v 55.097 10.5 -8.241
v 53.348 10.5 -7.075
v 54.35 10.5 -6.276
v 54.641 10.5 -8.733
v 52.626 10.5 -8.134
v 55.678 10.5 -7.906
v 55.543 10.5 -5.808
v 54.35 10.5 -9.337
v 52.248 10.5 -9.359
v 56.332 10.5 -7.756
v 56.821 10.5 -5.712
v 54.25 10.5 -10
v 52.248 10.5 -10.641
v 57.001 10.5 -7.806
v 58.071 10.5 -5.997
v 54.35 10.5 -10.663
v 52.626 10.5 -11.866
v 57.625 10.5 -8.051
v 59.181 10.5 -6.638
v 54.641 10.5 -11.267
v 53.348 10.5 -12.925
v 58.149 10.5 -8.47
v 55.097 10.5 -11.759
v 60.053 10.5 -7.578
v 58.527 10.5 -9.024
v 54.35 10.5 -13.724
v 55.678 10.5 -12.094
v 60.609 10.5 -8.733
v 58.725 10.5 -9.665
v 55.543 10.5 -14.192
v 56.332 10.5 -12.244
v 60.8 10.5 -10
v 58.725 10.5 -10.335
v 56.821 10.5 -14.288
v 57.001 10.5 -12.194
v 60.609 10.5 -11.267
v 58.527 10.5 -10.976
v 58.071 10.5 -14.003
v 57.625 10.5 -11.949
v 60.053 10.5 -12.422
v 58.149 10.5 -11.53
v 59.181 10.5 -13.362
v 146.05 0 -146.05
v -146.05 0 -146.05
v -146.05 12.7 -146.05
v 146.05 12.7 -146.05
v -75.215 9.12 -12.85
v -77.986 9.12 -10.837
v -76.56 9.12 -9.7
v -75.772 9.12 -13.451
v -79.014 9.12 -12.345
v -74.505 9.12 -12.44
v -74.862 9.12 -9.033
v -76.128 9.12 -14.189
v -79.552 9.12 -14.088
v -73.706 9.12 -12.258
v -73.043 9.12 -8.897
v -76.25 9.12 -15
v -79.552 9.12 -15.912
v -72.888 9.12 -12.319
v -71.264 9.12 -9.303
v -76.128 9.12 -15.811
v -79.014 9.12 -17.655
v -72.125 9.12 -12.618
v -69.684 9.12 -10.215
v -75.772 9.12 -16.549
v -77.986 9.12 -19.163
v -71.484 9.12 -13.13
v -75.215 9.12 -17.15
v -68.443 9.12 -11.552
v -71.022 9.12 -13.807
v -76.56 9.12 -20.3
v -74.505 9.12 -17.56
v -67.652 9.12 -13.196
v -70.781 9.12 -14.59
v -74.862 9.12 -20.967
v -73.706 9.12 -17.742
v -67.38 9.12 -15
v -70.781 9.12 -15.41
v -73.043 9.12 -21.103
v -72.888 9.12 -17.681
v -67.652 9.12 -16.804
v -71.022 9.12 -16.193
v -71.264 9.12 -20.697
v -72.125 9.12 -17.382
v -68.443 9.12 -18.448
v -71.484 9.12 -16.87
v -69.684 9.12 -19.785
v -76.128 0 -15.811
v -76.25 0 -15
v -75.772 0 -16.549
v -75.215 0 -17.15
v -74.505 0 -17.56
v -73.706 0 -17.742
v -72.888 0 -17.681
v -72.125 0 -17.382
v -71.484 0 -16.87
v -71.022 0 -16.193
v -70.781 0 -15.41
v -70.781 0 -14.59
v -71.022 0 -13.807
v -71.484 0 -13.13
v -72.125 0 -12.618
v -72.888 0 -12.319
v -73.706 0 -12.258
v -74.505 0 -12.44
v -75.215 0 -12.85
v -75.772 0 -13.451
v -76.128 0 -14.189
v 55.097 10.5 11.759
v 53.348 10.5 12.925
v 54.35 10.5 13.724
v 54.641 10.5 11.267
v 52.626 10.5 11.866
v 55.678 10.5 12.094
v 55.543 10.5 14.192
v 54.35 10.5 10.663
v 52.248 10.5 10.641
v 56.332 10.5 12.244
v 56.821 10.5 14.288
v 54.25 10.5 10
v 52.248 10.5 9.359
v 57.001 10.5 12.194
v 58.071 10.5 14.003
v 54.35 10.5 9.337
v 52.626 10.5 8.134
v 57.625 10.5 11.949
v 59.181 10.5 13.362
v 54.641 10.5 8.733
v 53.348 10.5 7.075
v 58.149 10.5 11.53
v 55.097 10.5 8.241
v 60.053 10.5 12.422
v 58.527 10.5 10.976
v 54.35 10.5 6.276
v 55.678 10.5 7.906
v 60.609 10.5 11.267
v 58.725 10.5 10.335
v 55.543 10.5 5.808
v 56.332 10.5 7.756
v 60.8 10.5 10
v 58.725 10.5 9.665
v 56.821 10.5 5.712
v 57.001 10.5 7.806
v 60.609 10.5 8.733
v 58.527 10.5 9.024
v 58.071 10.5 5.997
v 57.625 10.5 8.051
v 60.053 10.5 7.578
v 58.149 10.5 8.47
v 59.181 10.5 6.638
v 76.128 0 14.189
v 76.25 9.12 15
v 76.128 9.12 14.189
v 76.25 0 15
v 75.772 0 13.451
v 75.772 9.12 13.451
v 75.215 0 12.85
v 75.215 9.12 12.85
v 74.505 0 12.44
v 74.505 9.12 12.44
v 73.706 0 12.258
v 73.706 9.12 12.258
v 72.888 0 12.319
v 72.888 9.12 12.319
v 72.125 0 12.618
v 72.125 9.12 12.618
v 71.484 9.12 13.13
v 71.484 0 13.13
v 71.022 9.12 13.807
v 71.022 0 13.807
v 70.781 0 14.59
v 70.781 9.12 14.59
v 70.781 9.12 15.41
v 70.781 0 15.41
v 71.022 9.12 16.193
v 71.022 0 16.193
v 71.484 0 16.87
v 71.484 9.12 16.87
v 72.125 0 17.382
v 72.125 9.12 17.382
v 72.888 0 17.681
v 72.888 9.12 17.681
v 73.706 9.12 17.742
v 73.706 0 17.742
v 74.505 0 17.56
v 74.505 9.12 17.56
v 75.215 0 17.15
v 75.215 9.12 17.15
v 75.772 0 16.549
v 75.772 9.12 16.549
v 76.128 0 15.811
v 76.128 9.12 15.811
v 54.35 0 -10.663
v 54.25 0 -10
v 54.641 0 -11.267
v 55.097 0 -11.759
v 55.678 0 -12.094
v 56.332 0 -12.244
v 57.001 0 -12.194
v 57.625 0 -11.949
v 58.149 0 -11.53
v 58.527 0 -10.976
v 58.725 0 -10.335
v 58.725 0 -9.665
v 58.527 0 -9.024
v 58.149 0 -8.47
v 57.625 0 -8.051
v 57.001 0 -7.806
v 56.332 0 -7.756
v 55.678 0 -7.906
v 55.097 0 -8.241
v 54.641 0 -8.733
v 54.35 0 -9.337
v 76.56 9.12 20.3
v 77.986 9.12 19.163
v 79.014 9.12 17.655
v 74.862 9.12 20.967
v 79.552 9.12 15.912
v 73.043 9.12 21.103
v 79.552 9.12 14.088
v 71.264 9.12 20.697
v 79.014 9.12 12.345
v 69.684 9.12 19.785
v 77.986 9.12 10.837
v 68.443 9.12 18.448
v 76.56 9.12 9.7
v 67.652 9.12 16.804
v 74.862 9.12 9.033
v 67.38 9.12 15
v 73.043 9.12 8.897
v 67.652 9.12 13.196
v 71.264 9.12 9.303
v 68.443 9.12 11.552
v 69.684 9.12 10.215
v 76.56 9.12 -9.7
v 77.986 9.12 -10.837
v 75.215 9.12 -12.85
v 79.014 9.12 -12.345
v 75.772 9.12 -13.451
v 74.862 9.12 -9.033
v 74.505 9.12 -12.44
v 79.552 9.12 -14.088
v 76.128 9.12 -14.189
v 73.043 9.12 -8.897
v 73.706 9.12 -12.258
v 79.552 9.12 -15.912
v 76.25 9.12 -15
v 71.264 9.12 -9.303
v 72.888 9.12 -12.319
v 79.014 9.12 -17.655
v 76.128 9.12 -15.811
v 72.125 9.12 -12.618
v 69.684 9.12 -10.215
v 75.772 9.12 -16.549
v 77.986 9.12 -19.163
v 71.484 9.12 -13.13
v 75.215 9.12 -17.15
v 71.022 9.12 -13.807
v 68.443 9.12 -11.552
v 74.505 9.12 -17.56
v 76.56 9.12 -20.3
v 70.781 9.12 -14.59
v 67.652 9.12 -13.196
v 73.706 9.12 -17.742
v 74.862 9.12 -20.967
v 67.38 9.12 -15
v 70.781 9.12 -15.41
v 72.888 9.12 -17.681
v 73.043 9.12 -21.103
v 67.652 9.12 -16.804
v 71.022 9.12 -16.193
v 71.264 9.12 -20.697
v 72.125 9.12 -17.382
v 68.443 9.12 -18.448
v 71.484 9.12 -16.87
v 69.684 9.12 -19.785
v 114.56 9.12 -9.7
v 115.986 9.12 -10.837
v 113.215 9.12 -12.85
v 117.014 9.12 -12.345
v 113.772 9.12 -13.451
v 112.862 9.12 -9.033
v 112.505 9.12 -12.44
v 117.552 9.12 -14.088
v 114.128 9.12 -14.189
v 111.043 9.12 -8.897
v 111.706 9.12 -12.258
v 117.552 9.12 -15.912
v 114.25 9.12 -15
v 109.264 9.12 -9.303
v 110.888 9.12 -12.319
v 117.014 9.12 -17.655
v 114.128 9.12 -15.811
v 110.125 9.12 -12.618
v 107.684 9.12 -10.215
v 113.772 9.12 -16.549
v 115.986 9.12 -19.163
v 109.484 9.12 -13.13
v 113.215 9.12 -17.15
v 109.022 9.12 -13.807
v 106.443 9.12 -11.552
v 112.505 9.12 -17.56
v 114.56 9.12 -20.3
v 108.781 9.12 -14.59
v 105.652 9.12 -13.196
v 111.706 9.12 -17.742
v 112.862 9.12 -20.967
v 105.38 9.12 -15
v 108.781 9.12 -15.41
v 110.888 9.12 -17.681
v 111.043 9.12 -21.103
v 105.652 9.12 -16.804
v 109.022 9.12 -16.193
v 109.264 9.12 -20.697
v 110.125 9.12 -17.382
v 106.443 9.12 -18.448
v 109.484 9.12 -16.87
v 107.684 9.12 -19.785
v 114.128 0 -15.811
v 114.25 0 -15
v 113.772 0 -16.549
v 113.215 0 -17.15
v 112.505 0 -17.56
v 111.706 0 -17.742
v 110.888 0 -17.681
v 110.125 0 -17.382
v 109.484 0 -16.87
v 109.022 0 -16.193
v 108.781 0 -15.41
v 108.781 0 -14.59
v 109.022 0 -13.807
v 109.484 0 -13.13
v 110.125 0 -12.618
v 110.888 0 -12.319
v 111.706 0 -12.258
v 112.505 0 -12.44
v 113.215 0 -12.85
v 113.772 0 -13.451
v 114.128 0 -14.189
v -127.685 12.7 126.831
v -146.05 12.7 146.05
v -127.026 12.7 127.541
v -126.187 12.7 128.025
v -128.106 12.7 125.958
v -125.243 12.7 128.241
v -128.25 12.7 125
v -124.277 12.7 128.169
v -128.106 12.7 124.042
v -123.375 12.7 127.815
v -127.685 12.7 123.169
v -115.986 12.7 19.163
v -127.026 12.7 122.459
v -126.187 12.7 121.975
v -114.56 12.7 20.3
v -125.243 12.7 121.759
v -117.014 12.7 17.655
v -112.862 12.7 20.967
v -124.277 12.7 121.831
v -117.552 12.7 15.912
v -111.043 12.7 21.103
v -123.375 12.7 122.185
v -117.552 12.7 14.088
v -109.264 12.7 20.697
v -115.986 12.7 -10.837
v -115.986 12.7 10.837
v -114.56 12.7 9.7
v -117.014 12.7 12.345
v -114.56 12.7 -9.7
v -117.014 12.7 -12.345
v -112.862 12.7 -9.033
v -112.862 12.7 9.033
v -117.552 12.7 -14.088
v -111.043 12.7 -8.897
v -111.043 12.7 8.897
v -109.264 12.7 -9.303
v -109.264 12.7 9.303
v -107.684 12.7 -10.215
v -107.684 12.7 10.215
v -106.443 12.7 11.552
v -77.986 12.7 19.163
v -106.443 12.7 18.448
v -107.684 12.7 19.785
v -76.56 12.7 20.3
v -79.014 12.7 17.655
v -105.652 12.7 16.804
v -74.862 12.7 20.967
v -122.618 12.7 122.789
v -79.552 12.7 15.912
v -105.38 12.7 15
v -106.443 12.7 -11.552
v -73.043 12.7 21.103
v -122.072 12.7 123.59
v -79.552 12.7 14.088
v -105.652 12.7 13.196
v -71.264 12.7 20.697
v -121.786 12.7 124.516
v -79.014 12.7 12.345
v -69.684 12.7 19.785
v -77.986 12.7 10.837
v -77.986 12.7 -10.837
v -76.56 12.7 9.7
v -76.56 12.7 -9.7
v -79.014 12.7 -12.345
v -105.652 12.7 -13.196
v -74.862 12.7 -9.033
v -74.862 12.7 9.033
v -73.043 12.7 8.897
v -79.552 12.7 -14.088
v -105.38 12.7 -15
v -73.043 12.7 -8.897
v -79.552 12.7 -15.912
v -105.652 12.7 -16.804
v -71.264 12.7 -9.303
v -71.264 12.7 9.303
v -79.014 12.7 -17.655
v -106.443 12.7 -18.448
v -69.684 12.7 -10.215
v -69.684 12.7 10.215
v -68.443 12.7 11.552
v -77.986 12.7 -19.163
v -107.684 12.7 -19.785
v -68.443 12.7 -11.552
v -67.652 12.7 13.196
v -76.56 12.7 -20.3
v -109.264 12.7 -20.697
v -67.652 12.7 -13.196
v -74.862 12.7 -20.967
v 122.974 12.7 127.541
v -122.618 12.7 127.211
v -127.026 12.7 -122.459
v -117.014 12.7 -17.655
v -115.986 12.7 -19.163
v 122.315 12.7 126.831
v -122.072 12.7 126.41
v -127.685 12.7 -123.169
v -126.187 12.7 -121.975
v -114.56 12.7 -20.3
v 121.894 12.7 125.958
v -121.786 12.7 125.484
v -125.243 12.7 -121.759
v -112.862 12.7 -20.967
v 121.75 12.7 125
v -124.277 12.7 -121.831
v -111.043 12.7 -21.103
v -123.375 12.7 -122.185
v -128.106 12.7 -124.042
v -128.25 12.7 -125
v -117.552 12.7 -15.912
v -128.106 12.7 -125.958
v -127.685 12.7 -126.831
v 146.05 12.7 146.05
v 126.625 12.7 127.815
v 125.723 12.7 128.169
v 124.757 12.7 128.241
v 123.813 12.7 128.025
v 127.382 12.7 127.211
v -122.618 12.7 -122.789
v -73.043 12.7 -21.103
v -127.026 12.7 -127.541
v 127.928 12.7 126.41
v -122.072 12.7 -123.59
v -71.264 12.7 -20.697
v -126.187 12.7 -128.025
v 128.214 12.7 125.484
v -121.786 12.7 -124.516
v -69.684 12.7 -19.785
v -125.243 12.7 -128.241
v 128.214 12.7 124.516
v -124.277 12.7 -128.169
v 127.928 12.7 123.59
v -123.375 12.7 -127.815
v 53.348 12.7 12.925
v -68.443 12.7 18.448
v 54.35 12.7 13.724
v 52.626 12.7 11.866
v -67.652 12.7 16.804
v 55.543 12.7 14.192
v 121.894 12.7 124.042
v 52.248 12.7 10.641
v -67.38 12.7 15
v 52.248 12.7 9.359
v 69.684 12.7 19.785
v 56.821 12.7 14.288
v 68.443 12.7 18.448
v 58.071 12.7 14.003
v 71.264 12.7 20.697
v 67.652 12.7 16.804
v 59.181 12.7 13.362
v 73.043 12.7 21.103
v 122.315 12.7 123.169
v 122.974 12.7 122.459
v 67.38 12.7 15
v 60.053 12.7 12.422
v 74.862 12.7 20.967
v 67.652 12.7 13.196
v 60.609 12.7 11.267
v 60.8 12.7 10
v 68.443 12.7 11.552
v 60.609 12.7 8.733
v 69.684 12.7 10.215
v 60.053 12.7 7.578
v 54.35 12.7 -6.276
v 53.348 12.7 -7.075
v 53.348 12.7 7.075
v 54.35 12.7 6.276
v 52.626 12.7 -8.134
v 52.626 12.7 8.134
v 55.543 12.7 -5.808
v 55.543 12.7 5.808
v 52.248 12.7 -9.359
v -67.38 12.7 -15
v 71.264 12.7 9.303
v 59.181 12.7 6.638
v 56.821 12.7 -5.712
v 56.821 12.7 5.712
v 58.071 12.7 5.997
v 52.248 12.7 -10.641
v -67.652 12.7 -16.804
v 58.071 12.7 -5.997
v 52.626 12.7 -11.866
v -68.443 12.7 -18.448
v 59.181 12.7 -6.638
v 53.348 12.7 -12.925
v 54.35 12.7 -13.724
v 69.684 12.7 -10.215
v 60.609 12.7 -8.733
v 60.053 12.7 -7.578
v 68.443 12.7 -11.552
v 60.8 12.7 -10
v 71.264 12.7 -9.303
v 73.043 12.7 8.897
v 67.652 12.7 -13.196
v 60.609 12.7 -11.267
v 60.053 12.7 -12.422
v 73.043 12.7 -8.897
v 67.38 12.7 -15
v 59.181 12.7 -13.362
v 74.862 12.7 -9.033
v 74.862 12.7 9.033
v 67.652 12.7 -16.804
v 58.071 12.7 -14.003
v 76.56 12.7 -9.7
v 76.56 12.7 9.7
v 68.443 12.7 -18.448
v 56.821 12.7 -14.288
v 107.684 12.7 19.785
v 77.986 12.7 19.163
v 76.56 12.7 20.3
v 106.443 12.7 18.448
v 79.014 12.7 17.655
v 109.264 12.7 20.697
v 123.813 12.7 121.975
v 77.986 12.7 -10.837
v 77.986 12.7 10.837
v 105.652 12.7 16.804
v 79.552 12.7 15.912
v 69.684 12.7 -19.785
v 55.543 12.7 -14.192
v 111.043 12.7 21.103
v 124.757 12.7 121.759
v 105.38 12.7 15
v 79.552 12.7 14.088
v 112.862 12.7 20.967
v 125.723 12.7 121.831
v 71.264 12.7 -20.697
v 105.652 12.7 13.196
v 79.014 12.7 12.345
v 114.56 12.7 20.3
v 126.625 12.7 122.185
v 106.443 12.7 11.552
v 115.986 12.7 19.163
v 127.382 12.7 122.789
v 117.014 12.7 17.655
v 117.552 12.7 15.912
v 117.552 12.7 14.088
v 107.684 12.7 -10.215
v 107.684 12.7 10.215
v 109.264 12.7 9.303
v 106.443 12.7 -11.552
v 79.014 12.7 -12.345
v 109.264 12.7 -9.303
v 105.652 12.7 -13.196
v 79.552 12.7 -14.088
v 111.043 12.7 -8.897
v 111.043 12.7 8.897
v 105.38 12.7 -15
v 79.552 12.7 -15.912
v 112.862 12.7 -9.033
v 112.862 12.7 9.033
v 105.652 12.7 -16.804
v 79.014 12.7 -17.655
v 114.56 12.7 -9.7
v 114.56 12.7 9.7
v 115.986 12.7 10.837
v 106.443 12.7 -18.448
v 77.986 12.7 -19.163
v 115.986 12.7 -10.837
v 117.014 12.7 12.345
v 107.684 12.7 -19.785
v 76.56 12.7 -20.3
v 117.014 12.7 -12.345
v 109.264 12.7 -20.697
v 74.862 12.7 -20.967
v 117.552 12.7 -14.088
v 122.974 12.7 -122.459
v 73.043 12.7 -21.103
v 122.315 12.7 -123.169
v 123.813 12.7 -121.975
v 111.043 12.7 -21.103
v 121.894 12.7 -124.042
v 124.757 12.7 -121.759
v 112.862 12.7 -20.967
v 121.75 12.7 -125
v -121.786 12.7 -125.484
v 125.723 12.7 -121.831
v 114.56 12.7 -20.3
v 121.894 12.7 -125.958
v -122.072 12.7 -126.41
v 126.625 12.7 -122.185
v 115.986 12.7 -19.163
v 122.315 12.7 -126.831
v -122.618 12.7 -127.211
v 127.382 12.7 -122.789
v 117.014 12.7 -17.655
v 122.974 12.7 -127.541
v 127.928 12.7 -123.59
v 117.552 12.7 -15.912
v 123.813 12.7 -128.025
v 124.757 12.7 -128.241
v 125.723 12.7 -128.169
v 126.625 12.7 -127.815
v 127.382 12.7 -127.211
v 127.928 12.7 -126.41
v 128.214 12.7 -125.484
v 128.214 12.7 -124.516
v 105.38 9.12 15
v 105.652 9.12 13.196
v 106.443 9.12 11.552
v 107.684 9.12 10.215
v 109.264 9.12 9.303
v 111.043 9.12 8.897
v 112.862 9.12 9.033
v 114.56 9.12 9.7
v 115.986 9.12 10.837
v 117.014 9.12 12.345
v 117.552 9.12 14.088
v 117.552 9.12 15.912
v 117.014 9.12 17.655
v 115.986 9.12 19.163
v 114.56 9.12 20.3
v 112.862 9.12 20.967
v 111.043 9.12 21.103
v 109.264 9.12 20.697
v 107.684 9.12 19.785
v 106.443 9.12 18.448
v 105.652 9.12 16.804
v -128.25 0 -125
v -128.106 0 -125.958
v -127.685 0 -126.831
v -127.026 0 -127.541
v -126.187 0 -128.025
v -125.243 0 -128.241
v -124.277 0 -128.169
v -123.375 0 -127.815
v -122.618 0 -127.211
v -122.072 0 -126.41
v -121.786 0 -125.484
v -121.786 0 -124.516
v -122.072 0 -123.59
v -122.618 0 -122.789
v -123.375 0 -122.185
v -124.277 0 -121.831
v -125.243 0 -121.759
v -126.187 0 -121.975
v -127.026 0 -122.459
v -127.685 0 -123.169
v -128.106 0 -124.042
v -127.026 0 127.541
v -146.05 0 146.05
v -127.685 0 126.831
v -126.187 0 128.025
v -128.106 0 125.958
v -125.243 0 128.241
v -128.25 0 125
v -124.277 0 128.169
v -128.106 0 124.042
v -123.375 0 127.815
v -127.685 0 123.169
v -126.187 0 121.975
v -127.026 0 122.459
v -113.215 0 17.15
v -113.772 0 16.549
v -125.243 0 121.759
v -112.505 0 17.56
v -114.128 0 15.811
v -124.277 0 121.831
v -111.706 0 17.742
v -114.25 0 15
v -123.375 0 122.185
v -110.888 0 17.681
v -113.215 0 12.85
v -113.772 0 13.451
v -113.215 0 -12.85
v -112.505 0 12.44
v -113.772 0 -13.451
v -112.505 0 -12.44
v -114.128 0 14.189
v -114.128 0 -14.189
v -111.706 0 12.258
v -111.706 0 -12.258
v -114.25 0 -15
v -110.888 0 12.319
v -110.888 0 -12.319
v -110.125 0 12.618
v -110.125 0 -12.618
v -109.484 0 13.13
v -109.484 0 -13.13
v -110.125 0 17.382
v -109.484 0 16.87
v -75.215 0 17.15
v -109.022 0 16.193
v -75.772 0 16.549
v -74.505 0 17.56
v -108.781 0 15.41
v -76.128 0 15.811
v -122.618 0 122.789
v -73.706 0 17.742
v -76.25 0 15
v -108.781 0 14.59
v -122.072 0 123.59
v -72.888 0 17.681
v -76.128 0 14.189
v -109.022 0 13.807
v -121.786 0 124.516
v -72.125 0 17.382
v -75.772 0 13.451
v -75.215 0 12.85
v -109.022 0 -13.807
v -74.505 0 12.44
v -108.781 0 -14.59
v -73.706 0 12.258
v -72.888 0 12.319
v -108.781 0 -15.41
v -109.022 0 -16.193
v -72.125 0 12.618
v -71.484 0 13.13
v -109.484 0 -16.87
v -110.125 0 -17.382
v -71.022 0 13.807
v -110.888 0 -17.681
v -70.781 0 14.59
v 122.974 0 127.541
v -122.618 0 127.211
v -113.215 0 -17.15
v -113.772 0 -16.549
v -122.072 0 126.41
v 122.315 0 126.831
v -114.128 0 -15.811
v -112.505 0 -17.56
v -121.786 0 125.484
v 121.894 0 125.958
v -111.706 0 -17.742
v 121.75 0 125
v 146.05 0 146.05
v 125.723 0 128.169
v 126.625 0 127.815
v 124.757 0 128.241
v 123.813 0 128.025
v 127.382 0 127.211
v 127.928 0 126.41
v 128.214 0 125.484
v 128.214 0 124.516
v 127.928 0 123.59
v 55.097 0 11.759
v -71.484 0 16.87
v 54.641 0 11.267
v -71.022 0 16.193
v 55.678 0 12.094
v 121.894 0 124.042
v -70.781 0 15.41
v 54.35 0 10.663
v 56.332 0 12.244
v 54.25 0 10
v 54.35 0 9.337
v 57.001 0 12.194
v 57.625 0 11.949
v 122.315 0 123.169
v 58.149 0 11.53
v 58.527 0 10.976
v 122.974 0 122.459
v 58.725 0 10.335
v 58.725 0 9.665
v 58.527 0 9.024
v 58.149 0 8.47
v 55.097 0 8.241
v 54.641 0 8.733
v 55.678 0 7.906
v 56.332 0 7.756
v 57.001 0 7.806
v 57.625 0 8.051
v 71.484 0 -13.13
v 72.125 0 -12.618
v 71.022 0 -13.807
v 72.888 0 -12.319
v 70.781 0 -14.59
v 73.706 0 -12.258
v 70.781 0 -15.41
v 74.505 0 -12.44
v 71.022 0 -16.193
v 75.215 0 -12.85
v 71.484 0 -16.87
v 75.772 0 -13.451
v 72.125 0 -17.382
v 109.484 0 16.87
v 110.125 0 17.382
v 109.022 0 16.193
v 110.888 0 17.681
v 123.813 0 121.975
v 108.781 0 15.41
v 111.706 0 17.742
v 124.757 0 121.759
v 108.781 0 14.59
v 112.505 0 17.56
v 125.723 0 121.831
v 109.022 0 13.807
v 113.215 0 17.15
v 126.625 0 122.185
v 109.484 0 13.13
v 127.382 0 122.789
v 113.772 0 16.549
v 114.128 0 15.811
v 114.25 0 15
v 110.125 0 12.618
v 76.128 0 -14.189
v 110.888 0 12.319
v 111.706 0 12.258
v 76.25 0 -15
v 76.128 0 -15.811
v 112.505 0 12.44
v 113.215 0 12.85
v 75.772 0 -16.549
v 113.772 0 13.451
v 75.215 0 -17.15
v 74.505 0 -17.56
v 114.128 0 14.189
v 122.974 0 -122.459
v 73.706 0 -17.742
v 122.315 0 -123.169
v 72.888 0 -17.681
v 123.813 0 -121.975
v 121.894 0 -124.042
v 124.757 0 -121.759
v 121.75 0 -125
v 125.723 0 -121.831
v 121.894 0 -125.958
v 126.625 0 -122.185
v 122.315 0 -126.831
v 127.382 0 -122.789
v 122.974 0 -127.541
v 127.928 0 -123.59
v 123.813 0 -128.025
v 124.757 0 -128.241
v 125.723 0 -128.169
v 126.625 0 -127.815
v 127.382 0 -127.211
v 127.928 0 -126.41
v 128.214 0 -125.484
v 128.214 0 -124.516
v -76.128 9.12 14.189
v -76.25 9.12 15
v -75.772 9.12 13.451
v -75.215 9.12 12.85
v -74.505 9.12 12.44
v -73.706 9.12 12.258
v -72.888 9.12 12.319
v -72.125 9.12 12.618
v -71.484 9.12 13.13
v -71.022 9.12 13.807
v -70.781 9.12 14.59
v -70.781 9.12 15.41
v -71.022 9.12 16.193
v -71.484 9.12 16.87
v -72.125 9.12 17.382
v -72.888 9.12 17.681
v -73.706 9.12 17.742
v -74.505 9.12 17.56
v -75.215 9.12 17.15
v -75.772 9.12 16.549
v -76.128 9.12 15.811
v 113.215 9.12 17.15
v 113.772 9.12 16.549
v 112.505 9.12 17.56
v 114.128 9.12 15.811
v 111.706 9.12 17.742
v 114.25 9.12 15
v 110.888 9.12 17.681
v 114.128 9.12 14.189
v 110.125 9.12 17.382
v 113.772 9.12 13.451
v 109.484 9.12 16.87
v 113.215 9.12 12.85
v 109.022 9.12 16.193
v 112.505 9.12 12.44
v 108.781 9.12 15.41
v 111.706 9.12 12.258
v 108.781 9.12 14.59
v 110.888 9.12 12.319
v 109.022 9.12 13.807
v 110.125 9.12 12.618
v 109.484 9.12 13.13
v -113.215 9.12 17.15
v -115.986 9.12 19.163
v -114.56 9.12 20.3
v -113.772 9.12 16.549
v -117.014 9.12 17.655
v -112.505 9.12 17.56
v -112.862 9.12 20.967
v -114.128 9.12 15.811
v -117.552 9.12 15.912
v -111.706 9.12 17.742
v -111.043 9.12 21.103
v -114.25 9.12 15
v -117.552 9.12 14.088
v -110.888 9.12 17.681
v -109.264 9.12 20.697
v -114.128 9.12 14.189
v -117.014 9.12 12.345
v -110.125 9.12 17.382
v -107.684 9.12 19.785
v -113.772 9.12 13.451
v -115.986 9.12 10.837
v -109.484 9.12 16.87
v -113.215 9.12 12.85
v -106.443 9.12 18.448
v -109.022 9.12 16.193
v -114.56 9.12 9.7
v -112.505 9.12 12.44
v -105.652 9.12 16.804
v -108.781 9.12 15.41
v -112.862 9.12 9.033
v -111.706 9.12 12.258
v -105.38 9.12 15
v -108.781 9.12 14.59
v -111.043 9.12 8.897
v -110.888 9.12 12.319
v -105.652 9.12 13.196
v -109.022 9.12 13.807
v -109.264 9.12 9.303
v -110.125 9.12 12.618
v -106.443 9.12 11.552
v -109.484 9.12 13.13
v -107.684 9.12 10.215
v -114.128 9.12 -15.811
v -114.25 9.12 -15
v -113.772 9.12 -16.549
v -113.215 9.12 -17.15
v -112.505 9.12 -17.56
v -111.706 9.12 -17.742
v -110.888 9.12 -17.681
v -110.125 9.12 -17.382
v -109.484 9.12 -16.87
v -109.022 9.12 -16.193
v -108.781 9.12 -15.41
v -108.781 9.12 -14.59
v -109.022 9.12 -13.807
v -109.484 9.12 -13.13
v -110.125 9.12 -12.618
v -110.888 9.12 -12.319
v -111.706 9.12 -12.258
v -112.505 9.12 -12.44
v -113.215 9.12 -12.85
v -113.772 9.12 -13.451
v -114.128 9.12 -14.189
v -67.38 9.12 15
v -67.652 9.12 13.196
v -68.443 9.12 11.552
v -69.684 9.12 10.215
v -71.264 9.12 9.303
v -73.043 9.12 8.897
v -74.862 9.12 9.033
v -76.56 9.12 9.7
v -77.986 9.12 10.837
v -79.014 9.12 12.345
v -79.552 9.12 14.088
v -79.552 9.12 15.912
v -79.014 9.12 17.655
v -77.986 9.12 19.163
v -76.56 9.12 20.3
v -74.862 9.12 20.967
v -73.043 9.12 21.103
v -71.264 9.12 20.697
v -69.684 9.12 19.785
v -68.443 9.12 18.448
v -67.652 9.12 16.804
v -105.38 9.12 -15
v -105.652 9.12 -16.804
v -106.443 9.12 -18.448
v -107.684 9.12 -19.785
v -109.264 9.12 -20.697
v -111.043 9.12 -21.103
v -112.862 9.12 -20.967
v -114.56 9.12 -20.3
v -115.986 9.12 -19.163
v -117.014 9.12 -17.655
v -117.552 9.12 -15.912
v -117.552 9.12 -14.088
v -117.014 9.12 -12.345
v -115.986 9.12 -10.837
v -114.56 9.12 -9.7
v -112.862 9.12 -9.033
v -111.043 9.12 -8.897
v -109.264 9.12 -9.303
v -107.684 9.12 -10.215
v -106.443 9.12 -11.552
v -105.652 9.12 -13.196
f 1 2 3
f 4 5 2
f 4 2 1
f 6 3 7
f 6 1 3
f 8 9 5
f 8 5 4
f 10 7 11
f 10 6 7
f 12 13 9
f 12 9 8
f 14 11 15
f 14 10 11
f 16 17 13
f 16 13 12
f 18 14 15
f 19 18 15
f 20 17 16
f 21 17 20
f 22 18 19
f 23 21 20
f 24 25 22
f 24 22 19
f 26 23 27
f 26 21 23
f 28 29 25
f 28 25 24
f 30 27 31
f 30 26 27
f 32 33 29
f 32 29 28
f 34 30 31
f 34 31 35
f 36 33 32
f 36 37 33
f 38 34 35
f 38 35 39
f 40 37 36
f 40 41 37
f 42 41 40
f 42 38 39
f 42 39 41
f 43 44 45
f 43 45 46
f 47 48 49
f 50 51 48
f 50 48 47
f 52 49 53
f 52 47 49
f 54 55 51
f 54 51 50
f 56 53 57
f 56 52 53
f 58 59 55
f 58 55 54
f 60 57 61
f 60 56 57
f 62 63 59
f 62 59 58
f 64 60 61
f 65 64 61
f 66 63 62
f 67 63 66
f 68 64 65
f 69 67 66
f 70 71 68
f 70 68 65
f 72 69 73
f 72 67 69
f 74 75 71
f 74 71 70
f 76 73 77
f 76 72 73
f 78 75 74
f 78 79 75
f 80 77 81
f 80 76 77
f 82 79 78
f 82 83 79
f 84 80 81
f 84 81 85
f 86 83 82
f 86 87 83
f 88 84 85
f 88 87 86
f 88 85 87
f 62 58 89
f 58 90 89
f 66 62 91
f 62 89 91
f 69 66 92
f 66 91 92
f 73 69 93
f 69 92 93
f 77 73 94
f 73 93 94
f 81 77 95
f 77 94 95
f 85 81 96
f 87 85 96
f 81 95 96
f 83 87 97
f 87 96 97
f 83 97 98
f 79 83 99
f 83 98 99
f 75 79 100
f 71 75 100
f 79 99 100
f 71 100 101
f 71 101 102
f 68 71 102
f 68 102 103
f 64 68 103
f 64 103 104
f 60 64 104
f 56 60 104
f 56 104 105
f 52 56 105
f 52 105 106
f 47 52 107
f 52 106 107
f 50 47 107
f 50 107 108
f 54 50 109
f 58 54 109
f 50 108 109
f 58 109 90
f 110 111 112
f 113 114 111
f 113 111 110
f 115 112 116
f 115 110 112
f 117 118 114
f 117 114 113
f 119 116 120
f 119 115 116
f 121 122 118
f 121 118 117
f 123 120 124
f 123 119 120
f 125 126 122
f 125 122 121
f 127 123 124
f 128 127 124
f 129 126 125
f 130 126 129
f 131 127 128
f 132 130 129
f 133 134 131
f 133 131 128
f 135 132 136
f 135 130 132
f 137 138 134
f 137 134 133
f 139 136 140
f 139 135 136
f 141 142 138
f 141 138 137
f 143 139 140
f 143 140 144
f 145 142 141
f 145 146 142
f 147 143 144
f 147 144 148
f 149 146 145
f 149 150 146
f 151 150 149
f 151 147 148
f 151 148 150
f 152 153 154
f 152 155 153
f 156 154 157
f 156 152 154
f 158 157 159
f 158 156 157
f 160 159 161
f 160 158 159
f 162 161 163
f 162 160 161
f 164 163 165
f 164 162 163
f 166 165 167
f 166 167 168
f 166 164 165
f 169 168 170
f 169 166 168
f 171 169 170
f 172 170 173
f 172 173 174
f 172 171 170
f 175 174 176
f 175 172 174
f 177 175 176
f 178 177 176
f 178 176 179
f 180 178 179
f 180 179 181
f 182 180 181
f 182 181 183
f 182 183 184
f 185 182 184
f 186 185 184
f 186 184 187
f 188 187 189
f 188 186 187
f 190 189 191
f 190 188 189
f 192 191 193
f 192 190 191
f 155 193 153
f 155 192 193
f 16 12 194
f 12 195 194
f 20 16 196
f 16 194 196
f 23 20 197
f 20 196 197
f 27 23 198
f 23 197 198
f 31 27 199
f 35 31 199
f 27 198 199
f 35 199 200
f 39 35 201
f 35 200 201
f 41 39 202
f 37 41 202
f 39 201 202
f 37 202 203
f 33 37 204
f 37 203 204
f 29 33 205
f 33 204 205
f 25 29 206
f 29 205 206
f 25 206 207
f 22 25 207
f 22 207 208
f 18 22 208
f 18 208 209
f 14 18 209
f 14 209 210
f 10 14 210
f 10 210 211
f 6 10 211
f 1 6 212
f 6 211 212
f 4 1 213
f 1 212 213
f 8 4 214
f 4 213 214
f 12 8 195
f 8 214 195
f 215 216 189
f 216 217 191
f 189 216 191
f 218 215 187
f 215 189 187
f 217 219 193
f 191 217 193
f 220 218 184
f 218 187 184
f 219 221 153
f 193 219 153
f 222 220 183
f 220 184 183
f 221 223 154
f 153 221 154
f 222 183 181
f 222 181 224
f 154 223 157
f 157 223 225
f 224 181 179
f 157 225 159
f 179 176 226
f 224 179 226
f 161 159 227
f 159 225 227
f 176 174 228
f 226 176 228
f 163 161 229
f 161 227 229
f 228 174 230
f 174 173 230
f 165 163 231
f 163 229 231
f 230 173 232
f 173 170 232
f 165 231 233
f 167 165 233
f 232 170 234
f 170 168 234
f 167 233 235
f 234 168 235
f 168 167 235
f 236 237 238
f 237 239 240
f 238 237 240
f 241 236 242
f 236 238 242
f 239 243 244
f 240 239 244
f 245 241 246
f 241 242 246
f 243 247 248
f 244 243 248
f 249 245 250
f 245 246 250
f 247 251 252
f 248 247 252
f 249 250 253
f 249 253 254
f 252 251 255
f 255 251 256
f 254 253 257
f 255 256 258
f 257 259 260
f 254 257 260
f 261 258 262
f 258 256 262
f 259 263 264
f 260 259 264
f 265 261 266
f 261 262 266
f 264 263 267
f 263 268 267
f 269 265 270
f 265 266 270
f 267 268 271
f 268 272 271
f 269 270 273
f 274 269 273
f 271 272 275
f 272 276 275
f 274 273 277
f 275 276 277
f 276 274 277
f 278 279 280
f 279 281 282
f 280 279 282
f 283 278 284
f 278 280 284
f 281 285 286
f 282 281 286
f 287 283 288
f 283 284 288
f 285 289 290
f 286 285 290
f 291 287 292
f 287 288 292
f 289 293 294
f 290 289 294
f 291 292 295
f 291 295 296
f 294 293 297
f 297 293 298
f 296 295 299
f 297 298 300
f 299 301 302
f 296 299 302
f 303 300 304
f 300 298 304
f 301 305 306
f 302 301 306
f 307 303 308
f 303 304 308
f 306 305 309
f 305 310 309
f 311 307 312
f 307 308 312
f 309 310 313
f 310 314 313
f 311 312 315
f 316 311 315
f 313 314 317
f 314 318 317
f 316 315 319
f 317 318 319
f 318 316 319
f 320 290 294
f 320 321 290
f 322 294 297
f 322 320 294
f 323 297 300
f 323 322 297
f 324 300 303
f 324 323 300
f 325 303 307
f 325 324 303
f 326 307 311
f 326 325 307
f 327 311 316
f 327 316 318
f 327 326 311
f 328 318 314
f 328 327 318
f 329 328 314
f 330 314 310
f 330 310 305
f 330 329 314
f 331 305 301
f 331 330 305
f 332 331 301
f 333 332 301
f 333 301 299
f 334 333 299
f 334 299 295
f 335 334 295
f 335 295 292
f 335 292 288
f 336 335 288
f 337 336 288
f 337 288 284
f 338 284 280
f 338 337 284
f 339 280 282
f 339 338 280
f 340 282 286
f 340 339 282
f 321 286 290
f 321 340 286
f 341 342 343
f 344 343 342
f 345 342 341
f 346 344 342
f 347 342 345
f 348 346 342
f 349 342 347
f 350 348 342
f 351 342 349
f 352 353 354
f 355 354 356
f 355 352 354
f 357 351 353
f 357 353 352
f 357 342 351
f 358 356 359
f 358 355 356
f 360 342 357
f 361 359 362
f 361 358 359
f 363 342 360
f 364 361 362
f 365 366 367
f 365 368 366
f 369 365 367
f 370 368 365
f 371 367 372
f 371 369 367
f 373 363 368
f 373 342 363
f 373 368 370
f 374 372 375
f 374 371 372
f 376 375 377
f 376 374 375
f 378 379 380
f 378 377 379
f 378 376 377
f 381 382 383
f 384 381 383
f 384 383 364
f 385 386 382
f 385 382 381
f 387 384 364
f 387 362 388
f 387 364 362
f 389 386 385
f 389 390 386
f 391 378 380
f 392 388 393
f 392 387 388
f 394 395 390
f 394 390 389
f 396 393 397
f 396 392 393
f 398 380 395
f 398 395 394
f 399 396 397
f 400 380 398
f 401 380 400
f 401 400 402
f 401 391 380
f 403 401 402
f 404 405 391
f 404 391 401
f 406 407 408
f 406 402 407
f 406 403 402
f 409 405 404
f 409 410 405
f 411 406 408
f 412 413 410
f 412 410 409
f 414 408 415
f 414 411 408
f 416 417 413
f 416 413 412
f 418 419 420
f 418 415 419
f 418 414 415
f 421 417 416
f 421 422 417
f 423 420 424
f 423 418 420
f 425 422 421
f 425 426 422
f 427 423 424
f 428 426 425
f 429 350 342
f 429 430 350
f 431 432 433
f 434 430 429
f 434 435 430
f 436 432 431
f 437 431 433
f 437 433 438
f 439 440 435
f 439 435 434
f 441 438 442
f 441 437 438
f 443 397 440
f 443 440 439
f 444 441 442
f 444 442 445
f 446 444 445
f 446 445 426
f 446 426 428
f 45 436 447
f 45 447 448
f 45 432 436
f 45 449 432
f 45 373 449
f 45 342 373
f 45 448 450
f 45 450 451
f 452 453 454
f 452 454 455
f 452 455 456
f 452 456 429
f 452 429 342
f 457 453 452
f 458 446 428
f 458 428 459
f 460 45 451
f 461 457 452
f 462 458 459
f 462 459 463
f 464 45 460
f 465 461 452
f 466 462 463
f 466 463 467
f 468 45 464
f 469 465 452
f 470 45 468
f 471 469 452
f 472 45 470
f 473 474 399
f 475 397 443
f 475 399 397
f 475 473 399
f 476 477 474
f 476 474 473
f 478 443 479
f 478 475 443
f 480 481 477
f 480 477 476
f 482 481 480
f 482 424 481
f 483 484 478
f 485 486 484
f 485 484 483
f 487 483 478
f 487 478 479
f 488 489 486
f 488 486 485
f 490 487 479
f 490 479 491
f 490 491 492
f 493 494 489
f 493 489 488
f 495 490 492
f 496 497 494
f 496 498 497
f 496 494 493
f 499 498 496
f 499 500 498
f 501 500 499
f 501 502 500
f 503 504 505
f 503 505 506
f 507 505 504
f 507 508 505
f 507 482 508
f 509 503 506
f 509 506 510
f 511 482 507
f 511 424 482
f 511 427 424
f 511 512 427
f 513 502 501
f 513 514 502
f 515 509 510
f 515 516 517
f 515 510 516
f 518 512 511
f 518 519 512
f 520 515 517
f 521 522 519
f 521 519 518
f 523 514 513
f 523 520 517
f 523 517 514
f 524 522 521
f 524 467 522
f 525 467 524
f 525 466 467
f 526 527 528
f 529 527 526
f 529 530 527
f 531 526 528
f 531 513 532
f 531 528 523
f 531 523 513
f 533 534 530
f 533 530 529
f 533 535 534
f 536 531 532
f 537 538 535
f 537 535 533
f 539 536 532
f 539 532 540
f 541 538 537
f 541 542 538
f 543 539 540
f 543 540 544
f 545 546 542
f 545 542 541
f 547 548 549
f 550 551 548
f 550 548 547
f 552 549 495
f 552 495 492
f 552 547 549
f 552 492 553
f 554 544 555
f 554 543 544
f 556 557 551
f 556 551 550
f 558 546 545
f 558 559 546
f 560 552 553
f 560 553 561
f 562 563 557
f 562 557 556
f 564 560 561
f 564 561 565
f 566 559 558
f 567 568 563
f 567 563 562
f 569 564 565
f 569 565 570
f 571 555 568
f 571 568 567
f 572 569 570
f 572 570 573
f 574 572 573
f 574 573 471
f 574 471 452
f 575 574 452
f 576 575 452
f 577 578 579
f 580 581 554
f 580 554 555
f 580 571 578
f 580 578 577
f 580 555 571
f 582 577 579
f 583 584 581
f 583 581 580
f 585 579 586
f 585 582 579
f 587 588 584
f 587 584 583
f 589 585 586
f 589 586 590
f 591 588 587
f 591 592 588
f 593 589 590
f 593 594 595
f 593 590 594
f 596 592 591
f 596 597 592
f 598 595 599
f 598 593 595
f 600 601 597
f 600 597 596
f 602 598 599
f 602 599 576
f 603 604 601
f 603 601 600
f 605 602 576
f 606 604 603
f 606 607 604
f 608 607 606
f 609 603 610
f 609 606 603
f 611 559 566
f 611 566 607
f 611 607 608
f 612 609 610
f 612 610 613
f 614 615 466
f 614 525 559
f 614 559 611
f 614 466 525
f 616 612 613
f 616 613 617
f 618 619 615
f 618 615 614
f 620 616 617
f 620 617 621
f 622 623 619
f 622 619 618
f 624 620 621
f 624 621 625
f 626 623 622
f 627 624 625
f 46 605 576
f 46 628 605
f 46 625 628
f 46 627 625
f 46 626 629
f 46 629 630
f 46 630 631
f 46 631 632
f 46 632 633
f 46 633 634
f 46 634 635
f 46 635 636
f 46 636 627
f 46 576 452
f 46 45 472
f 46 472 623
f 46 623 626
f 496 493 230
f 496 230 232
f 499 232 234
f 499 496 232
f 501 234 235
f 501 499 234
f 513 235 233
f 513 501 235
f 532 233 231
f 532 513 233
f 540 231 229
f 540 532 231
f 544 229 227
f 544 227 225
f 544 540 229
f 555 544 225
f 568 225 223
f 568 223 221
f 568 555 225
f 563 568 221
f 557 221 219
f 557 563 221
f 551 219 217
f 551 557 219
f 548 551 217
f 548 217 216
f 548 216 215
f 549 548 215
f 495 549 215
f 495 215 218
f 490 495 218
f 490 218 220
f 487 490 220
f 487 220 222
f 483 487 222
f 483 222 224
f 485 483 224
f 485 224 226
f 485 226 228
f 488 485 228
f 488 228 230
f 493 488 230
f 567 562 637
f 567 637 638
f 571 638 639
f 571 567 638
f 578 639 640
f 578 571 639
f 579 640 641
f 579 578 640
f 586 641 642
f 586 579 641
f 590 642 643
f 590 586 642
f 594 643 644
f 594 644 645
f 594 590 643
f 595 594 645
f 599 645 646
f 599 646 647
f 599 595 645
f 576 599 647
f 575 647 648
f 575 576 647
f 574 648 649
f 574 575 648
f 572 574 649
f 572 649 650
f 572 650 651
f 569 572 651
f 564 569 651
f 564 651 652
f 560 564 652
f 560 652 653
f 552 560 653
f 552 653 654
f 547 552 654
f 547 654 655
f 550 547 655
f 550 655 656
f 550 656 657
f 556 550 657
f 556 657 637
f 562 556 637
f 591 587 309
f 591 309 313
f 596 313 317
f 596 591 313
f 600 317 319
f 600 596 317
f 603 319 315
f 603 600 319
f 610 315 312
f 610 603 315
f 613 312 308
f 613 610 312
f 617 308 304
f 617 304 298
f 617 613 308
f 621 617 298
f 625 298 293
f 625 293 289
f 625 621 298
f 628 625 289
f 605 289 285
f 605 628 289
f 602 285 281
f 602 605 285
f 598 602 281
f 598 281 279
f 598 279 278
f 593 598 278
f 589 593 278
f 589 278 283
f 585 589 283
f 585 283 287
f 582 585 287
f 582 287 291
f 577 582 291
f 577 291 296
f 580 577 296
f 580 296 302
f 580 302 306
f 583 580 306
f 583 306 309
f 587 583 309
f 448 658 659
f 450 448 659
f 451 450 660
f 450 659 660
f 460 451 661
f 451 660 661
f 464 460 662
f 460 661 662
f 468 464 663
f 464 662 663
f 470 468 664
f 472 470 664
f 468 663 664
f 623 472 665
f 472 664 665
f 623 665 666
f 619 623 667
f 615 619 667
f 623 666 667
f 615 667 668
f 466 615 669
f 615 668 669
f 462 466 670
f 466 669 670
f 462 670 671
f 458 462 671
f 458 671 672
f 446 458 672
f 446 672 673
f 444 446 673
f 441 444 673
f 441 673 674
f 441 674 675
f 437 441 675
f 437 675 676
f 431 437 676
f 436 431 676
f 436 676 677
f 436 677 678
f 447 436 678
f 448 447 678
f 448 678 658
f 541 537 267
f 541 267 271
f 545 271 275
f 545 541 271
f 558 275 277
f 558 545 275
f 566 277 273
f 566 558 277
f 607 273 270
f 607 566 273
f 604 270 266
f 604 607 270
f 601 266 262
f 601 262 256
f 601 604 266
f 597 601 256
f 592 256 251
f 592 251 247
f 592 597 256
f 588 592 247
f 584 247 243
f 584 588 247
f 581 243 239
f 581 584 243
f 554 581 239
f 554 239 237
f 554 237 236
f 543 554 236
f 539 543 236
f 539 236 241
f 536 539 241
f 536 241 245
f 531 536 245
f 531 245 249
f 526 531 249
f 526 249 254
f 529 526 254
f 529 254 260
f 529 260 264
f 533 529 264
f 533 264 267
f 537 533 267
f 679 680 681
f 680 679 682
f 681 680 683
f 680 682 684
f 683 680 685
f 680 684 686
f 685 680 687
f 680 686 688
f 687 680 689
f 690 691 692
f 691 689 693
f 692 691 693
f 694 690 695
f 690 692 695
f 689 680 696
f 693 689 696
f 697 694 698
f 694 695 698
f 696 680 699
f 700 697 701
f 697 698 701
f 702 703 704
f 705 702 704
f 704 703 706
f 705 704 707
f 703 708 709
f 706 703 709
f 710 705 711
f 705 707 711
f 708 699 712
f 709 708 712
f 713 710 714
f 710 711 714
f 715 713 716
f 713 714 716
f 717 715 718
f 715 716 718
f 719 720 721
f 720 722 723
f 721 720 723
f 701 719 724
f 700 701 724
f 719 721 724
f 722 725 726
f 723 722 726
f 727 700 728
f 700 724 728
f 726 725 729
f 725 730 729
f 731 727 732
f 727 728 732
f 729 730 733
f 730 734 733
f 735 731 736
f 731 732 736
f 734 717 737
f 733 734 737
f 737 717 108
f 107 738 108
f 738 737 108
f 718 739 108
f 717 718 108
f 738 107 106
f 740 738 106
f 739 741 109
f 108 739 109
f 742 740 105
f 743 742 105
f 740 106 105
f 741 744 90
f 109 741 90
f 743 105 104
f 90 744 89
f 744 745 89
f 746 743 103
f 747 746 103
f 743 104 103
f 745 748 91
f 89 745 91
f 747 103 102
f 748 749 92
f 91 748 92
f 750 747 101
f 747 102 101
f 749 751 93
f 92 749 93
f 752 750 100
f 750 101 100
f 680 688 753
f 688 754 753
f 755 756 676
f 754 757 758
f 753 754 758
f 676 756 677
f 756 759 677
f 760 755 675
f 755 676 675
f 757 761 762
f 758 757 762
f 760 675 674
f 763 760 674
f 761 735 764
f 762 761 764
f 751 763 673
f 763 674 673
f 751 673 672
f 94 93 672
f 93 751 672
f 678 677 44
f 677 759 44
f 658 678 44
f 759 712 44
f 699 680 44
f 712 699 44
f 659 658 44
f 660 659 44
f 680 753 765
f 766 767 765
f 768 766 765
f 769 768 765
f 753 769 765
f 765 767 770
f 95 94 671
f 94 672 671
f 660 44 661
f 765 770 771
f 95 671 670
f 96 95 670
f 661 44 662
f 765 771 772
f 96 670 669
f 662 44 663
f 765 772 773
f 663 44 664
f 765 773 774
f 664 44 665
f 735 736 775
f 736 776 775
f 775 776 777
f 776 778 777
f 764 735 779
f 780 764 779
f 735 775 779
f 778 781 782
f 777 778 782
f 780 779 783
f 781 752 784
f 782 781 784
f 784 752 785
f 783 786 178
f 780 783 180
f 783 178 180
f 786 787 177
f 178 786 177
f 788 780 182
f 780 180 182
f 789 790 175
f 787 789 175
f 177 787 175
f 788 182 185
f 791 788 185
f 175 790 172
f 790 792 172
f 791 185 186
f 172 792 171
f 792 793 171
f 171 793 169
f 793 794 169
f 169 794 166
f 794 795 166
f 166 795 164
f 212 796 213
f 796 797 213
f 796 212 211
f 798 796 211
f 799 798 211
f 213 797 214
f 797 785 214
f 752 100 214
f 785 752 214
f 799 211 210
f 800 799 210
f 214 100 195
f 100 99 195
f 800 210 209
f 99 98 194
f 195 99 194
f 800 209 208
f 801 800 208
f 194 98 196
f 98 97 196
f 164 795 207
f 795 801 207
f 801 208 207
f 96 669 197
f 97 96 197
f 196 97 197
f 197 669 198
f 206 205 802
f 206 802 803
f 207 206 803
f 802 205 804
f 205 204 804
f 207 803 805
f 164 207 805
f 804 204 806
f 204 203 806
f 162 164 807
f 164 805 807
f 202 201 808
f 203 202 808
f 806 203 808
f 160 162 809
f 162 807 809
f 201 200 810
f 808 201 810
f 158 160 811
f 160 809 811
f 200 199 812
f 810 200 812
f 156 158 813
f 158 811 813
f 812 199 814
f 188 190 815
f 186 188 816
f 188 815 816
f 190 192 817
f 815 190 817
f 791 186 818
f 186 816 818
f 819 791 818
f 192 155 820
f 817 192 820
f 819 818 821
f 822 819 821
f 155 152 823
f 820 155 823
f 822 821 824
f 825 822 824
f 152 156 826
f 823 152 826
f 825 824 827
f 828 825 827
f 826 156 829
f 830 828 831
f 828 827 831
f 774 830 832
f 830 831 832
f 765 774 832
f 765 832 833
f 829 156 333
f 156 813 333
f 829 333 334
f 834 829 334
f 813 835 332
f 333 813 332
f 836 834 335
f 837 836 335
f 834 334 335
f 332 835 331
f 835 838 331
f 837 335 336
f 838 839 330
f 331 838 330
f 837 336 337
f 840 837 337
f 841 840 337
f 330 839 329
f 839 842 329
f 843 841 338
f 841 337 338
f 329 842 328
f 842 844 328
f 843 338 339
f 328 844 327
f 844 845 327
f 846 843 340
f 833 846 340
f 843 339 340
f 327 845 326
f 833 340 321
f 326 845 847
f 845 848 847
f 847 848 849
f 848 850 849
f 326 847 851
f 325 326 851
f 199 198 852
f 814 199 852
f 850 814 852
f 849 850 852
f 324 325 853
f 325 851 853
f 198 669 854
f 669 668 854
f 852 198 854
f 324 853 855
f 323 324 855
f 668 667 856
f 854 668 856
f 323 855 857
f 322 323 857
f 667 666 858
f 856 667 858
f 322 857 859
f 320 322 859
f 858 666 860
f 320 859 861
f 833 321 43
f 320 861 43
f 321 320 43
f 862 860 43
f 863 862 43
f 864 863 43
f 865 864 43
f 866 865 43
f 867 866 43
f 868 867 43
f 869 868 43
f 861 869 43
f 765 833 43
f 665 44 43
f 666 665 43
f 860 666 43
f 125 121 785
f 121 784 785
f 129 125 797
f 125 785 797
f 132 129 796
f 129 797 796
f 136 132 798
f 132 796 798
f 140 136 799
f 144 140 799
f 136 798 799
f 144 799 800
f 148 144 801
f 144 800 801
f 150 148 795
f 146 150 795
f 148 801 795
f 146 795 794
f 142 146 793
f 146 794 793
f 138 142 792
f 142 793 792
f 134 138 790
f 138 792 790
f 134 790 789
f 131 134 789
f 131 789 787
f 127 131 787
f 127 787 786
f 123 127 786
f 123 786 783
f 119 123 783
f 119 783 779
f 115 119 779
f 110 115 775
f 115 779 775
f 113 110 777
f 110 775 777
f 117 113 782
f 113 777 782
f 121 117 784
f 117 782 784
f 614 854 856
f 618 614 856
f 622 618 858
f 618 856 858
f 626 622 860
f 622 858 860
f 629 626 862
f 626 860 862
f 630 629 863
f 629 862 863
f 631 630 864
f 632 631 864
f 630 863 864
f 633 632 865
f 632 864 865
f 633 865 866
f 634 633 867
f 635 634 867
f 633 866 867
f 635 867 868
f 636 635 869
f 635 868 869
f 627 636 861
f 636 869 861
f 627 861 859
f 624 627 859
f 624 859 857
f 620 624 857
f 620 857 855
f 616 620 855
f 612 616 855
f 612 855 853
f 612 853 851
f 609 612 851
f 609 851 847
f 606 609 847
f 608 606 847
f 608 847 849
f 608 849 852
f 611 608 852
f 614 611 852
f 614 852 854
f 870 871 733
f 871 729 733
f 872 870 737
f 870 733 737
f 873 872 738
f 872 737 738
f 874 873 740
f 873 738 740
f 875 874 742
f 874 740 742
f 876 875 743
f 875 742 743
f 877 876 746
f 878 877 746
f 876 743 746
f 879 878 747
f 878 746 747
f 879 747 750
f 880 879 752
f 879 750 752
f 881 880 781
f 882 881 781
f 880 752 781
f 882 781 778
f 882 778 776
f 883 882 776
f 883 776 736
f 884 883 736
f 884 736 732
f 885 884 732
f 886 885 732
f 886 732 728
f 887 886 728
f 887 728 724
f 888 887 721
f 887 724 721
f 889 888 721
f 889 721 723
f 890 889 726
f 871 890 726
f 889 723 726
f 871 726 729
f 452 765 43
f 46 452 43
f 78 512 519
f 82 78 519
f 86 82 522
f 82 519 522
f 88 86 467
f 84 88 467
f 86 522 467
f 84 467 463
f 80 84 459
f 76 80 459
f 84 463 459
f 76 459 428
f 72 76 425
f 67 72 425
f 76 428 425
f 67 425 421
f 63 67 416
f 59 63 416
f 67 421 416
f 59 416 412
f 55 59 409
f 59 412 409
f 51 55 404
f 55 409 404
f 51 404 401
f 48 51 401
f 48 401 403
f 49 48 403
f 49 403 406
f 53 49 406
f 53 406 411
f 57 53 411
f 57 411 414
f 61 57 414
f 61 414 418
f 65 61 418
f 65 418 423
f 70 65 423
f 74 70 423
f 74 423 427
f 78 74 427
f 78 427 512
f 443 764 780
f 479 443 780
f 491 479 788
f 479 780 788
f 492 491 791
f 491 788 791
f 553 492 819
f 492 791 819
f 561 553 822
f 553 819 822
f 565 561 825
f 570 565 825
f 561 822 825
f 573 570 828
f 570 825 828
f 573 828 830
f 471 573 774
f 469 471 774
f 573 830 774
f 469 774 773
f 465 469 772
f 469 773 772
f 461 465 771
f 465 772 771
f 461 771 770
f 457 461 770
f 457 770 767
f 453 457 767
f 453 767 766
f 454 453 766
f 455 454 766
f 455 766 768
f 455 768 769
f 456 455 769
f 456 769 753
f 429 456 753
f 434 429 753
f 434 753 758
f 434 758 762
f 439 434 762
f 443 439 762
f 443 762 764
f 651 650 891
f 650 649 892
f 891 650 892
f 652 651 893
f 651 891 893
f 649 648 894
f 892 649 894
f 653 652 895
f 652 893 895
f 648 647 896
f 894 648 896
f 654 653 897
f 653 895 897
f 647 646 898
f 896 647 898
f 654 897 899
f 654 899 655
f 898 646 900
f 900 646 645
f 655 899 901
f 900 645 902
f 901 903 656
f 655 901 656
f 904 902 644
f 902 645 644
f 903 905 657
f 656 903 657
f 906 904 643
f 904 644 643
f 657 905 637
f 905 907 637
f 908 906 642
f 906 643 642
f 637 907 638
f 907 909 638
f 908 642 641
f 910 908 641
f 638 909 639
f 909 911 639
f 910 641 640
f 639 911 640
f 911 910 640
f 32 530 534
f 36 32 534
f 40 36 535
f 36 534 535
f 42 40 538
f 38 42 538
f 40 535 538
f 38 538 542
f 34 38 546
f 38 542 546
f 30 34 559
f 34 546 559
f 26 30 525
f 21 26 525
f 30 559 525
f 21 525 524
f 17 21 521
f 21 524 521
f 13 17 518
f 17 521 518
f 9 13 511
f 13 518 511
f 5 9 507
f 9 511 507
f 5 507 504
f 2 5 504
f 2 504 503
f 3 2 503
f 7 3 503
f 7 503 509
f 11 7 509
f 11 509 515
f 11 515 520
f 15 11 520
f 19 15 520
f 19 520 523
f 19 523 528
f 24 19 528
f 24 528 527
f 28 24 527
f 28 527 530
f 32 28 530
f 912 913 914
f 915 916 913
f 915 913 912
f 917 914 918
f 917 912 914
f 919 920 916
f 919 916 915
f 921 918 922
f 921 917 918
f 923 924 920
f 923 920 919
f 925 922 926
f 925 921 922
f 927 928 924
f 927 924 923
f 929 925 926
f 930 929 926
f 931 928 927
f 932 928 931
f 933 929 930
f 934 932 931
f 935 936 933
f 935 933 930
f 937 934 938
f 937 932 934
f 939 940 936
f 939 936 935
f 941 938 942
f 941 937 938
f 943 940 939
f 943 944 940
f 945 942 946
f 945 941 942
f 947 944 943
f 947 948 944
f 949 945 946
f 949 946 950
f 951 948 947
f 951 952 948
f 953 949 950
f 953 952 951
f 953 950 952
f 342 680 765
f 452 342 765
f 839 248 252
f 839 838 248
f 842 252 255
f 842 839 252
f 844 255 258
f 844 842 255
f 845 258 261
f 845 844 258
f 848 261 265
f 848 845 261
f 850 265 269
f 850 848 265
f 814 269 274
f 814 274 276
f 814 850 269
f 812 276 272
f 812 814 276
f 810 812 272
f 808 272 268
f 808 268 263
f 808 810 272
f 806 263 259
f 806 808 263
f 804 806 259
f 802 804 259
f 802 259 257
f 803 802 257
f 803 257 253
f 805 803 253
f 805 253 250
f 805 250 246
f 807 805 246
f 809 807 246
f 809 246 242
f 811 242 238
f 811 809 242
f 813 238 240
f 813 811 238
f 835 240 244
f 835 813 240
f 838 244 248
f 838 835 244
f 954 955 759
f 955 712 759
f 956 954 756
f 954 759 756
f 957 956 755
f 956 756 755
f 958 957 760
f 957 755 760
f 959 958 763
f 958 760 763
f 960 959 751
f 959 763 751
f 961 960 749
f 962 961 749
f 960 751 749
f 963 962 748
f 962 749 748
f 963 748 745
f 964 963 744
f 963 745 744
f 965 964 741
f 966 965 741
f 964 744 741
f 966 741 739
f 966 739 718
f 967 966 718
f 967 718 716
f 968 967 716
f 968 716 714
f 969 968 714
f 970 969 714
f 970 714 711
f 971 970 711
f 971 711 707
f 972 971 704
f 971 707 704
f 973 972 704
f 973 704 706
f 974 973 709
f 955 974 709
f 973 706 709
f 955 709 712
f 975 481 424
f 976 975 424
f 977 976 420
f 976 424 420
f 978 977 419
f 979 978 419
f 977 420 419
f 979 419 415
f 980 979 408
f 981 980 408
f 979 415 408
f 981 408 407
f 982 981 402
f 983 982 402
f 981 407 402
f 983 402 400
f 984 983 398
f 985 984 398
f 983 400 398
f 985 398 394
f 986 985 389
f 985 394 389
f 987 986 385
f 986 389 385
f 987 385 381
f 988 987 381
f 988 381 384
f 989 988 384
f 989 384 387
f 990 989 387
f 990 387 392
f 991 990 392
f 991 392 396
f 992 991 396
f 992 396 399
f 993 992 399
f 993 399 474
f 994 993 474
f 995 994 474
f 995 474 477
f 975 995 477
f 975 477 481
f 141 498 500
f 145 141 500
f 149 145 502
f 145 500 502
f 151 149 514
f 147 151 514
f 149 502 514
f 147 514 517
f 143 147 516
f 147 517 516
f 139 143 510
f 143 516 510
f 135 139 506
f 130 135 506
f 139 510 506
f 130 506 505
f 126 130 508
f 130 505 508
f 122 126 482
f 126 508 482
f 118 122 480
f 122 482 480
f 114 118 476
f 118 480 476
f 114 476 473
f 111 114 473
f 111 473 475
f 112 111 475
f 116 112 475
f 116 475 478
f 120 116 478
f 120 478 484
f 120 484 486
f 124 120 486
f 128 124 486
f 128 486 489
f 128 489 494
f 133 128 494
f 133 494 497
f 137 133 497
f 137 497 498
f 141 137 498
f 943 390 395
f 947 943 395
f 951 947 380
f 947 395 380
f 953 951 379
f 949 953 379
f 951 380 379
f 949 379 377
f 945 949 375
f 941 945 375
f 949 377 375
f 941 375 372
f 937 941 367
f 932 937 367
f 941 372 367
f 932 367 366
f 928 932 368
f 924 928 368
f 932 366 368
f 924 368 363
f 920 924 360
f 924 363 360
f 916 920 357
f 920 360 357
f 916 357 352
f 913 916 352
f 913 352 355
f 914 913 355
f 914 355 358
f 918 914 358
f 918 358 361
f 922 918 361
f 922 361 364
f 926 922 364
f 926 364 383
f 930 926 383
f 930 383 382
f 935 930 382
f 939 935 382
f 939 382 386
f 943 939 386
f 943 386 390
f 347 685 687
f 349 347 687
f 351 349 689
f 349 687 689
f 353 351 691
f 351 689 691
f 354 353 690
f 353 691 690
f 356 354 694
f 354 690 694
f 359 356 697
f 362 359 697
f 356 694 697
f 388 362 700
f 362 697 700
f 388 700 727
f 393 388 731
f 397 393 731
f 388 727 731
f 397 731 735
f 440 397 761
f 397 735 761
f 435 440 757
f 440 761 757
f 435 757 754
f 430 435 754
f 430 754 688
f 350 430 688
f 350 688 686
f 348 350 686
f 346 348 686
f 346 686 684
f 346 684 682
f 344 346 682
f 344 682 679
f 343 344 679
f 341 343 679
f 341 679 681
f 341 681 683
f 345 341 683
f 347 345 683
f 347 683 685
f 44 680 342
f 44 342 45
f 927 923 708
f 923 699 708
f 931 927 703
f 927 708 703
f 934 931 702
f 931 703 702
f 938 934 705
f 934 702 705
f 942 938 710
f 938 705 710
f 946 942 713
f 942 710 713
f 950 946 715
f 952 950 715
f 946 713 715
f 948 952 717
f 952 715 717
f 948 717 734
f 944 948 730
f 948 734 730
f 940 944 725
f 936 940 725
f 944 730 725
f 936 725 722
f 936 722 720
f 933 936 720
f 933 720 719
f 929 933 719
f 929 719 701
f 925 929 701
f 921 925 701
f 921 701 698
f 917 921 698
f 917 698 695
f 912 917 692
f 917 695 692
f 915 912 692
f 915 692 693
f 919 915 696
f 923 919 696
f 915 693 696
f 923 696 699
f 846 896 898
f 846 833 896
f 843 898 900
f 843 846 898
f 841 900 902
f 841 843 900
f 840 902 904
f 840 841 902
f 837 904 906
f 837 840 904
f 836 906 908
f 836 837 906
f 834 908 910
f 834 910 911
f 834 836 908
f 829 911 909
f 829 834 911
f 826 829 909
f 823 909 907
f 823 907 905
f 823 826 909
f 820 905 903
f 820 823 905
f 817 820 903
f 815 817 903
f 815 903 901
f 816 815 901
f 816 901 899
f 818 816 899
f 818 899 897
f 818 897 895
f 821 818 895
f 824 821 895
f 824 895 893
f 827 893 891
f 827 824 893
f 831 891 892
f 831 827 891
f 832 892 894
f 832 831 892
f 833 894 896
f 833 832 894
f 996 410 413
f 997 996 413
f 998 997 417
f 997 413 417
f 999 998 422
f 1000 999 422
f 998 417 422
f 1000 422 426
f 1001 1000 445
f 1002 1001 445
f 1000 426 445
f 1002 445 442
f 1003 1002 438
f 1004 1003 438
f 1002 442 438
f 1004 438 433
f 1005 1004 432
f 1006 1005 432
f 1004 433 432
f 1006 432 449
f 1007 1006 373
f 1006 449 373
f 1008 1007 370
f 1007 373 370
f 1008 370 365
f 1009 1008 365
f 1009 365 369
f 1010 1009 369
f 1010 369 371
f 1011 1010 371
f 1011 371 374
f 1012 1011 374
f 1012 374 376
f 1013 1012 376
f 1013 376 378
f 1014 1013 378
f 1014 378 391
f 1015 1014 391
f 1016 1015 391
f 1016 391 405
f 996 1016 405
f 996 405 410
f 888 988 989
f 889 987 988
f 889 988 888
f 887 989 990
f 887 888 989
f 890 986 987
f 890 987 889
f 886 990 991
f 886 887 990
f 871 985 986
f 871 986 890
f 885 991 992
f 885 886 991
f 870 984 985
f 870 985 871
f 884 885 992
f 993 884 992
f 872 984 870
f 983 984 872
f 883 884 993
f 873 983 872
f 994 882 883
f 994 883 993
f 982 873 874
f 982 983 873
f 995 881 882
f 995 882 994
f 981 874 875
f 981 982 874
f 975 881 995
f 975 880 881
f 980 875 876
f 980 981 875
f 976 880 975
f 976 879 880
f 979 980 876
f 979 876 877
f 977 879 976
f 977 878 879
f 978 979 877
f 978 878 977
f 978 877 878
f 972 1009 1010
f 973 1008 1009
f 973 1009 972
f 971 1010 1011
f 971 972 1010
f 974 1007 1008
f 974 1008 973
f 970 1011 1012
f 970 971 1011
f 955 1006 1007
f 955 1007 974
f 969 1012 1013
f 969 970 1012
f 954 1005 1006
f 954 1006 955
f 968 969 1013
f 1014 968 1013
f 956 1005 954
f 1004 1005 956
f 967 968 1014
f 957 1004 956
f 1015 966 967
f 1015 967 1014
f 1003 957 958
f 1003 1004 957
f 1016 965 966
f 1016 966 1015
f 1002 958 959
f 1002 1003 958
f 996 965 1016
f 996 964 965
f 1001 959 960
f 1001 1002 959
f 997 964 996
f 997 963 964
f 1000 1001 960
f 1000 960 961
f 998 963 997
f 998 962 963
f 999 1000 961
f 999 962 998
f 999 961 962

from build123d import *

# Parameters (mm, degrees)
SKETCH2_W                               = 292.1
SKETCH2_H                               = 292.1
BOSS_EXTRUDE1_DEPTH                     = 12.7
F_6_5_6_5_DIAMETER_HOLE1_D              = 6.5
CBORE_FOR_M5_HEX_HEAD_BOLT1_D           = 5.5
CBORE_FOR_M5_HEX_HEAD_BOLT1_CBORE_D     = 12.24
CBORE_FOR_M5_HEX_HEAD_BOLT1_CBORE_DEPTH = 3.58
CBORE_FOR_M4_SBHCS1_D                   = 4.5
CBORE_FOR_M4_SBHCS1_CBORE_D             = 8.6
CBORE_FOR_M4_SBHCS1_CBORE_DEPTH         = 2.2


with BuildPart() as part:
    # Sketch2 → Boss-Extrude1 (new body)
    with BuildSketch(Plane(origin=(0, 0, 0), x_dir=(1, 0, 0), z_dir=(0, 1, 0))):
        Rectangle(SKETCH2_W, SKETCH2_H)
    extrude(amount=BOSS_EXTRUDE1_DEPTH)

    # Ø6.5 (6.5) Diameter Hole1 (through all)
    with Locations(Plane(origin=(0, 12.7, 0), x_dir=(1, 0, 0), z_dir=(0, 1, 0))):
        with Locations((-125, 125), (125, 125), (125, -125), (-125, -125)):
            Hole(F_6_5_6_5_DIAMETER_HOLE1_D / 2)

    # CBORE for M5 Hex Head Bolt1 (through all)
    with Locations(Plane(origin=(0, 12.7, 0), x_dir=(1, 0, 0), z_dir=(0, 1, 0))):
        with Locations((-73.5, -15), (-111.5, 15), (-111.5, -15), (-73.5, 15)):
            cbore_for_m5_hex_head_bolt1 = CounterBoreHole(CBORE_FOR_M5_HEX_HEAD_BOLT1_D / 2, CBORE_FOR_M5_HEX_HEAD_BOLT1_CBORE_D / 2, CBORE_FOR_M5_HEX_HEAD_BOLT1_CBORE_DEPTH)

    # Mirror1: CBORE for M5 Hex Head Bolt1 across plane
    add(cbore_for_m5_hex_head_bolt1.mirror(Plane(origin=(0, 0, 0), x_dir=(0, 0, 1), z_dir=(1, 0, 0))), mode=Mode.SUBTRACT)

    # CBORE for M4 SBHCS1 (through all)
    with Locations(Plane(origin=(0, 12.7, 0), x_dir=(1, 0, 0), z_dir=(0, 1, 0))):
        with Locations((56.500001429, 10), (56.500001429, -10.0000005)):
            CounterBoreHole(CBORE_FOR_M4_SBHCS1_D / 2, CBORE_FOR_M4_SBHCS1_CBORE_D / 2, CBORE_FOR_M4_SBHCS1_CBORE_DEPTH)


solid = part.part
